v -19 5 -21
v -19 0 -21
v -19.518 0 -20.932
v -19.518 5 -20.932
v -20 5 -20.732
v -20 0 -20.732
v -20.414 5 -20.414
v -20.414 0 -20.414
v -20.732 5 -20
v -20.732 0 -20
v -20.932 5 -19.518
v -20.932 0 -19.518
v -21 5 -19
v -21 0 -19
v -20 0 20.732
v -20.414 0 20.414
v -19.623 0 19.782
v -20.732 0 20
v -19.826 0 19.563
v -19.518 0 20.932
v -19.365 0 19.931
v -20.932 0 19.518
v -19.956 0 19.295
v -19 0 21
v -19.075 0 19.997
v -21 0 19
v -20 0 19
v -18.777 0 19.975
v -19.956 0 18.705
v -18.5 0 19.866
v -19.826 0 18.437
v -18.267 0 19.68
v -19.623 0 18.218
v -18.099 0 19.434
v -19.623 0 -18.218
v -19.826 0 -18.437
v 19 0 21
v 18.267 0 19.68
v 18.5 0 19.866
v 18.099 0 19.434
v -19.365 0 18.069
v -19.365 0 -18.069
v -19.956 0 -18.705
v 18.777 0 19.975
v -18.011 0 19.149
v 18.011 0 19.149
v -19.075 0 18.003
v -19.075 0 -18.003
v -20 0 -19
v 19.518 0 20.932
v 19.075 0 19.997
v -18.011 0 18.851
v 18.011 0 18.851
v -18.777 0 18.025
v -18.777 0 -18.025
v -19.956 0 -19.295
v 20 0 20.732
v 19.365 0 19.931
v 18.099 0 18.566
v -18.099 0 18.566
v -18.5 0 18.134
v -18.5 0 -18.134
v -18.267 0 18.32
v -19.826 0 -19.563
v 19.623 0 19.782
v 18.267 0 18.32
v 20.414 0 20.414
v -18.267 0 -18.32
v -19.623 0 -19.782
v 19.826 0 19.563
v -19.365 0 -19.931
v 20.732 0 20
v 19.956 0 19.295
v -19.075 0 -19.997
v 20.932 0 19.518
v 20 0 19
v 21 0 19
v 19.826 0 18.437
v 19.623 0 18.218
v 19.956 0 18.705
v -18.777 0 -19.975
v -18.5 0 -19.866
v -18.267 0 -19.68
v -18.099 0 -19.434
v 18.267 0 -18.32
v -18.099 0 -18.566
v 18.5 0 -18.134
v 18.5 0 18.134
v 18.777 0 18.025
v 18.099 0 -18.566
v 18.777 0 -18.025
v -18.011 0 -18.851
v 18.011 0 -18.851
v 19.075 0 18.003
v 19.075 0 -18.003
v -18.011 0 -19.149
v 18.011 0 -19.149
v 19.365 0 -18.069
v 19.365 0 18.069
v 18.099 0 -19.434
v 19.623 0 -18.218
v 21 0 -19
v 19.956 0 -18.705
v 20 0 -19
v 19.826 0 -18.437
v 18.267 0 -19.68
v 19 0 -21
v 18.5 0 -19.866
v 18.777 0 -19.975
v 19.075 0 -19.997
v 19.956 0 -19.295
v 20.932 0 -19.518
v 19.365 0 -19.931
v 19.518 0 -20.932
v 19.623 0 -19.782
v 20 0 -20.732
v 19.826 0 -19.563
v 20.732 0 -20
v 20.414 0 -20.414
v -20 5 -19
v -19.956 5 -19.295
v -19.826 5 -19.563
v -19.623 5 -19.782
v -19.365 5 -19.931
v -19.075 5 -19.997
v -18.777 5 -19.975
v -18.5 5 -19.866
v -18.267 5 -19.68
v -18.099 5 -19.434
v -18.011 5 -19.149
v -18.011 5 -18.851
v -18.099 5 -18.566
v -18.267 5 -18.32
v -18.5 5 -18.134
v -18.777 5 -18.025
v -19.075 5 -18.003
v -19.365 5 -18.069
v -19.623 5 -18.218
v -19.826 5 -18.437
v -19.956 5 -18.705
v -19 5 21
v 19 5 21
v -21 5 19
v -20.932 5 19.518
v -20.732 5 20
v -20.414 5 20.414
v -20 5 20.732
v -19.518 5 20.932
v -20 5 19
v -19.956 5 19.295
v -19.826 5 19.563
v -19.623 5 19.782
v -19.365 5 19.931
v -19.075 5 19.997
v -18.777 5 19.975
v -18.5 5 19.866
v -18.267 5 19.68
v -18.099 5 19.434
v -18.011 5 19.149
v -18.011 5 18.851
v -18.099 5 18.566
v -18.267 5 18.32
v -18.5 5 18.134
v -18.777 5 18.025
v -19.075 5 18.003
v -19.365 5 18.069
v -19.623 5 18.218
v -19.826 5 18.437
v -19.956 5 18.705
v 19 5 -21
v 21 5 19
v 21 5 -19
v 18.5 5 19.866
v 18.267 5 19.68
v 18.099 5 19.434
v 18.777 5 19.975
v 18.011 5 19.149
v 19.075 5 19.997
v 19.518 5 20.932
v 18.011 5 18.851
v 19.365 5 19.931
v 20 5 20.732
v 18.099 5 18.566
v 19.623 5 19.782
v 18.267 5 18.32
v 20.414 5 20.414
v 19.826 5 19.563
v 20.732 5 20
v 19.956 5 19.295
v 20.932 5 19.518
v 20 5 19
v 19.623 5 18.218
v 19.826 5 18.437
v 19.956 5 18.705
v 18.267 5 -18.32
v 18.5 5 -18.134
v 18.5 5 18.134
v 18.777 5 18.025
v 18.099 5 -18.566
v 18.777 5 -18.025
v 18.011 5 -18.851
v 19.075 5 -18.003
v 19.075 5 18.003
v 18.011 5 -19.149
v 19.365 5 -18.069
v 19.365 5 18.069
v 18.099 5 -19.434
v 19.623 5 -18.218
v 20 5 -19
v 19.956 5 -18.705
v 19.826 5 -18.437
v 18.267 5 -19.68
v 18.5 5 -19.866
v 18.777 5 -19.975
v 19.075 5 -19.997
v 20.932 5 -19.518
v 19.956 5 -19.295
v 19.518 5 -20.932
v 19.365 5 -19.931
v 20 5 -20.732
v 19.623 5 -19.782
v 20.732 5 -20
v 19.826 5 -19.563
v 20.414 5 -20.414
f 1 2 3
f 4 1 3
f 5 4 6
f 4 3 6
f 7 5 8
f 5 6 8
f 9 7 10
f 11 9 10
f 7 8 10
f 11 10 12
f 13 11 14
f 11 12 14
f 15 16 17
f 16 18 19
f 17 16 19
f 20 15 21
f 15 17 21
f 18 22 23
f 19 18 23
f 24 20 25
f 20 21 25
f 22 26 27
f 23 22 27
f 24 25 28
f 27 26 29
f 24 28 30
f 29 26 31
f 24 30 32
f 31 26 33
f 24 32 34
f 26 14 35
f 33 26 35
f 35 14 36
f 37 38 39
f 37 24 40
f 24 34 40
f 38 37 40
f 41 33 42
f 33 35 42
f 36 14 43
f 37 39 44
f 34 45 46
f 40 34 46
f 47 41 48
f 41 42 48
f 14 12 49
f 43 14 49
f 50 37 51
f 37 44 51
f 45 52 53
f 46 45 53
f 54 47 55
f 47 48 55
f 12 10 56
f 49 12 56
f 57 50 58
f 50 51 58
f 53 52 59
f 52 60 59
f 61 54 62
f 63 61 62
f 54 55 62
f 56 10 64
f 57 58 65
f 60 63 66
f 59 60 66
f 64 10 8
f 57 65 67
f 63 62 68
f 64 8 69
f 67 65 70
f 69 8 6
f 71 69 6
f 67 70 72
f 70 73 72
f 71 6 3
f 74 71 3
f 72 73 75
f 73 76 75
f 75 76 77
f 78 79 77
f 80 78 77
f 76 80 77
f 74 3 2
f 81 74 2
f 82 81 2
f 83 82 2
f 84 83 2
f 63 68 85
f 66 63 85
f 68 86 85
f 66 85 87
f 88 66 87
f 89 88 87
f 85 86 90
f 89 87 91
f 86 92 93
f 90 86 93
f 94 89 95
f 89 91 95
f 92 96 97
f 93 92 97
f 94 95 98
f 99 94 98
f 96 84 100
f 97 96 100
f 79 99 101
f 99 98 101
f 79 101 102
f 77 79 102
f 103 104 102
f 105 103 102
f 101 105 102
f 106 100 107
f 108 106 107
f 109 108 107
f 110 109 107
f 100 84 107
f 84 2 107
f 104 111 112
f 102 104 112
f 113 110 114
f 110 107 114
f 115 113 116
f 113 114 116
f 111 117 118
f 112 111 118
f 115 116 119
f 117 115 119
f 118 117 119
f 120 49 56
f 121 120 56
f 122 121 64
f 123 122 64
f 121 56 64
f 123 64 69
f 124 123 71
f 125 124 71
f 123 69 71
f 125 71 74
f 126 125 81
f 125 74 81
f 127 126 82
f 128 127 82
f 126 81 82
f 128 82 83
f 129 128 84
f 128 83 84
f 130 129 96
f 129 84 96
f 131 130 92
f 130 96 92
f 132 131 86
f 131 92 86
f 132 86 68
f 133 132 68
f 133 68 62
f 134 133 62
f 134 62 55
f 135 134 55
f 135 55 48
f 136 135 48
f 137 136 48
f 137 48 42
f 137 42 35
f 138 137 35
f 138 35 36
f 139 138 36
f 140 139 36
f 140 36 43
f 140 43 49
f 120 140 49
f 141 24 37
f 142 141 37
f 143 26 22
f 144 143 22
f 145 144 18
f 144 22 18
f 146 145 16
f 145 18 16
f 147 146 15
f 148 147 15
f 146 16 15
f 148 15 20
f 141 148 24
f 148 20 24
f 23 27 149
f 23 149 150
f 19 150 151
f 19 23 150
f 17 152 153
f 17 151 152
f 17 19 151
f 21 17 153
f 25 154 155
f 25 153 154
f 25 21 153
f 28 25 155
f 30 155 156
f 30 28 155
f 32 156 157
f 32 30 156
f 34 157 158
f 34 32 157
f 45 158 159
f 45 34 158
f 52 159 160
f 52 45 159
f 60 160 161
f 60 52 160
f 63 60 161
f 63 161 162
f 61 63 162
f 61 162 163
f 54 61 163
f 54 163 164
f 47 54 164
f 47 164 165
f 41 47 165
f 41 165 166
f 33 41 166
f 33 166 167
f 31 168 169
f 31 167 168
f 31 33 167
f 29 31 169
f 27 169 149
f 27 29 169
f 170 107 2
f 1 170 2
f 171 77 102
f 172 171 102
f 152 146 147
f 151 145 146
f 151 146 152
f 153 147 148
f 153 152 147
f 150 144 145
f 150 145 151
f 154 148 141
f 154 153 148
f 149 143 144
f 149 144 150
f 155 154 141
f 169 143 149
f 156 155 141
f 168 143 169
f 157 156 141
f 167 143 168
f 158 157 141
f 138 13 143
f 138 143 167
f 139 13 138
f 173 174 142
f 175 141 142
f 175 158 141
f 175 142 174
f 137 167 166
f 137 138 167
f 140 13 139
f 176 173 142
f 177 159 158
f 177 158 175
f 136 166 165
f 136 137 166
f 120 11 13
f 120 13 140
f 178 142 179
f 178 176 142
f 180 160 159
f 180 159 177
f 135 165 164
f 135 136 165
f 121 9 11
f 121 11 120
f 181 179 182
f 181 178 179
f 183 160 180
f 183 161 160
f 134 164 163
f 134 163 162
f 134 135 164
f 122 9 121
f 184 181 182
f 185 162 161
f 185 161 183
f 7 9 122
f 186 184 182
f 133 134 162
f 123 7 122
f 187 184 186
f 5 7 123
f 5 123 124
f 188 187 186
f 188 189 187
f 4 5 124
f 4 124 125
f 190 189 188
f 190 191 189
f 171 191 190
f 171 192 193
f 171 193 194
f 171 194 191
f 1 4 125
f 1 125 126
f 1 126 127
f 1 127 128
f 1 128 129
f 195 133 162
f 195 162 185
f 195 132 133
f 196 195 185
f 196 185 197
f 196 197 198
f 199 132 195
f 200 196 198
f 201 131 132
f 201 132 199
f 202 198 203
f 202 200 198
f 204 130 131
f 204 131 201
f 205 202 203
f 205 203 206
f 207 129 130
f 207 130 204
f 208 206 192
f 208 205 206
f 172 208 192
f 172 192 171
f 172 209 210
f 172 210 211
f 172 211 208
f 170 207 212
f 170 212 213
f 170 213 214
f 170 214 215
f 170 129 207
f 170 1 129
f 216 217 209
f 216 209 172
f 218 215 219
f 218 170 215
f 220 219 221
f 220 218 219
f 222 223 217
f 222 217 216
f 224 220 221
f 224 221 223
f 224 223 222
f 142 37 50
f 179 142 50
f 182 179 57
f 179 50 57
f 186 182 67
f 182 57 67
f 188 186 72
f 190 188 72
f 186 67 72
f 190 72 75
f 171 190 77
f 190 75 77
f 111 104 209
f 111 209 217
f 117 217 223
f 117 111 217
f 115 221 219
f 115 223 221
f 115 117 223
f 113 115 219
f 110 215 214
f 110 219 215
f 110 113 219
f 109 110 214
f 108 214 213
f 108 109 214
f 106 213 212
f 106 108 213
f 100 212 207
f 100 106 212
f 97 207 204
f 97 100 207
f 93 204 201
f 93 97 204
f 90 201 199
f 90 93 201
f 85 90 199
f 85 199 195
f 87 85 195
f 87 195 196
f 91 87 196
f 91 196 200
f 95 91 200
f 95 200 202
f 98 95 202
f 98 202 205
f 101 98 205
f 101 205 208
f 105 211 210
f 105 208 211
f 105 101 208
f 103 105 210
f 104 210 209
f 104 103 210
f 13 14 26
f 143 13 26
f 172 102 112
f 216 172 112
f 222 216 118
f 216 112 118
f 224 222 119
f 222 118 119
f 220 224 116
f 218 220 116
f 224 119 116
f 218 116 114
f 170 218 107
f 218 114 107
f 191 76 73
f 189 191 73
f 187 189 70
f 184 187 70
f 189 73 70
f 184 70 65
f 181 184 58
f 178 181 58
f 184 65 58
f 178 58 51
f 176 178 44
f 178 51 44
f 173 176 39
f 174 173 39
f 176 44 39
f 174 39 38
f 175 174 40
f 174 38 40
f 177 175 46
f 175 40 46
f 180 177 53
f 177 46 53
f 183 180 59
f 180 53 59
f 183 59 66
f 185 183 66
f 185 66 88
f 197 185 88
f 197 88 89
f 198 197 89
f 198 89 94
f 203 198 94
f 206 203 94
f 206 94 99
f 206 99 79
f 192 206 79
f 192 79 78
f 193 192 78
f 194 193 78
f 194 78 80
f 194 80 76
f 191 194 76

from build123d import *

# Parameters (mm, degrees)
BOSS_EXTRUDE1_DEPTH   = 5
F_2_0MM_DOWEL_HOLE1_D = 2
MIRROR2_COPY_1_D      = 2


with BuildPart() as part:
    # Sketch1 → Boss-Extrude1 (new body)
    with BuildSketch(Plane(origin=(0, 0, 0), x_dir=(1, 0, 0), z_dir=(0, 1, 0))):
        with BuildLine():
            Line((-19, -21), (19, -21))
            ThreePointArc((19, -21), (20.414213562, -20.414213562), (21, -19))
            Line((21, -19), (21, 19))
            ThreePointArc((21, 19), (20.414213562, 20.414213562), (19, 21))
            Line((19, 21), (-19, 21))
            ThreePointArc((-19, 21), (-20.414213562, 20.414213562), (-21, 19))
            Line((-21, 19), (-21, -19))
            ThreePointArc((-21, -19), (-20.414213562, -20.414213562), (-19, -21))
        make_face()
    extrude(amount=BOSS_EXTRUDE1_DEPTH)

    # Ø2.0mm Dowel Hole1 (through all)
    with Locations(Plane(origin=(0, 5, 0), x_dir=(1, 0, 0), z_dir=(0, 1, 0))):
        with Locations((-19, 19)):
            f_2_0mm_dowel_hole1 = Hole(F_2_0MM_DOWEL_HOLE1_D / 2)

    # Mirror1: Ø2.0mm Dowel Hole1 across plane
    add(f_2_0mm_dowel_hole1.mirror(Plane(origin=(0, 0, 0), x_dir=(0, 0, 1), z_dir=(1, 0, 0))), mode=Mode.SUBTRACT)

    # Mirror2: Ø2.0mm Dowel Hole1 across plane
    add(f_2_0mm_dowel_hole1.mirror(Plane.XY), mode=Mode.SUBTRACT)

    # Mirror2 copy 1 (through all)
    with Locations(Plane(origin=(0, 5, 0), x_dir=(-1, 0, 0), z_dir=(0, 1, 0))):
        with Locations((-19, 19)):
            Hole(MIRROR2_COPY_1_D / 2)


solid = part.part
